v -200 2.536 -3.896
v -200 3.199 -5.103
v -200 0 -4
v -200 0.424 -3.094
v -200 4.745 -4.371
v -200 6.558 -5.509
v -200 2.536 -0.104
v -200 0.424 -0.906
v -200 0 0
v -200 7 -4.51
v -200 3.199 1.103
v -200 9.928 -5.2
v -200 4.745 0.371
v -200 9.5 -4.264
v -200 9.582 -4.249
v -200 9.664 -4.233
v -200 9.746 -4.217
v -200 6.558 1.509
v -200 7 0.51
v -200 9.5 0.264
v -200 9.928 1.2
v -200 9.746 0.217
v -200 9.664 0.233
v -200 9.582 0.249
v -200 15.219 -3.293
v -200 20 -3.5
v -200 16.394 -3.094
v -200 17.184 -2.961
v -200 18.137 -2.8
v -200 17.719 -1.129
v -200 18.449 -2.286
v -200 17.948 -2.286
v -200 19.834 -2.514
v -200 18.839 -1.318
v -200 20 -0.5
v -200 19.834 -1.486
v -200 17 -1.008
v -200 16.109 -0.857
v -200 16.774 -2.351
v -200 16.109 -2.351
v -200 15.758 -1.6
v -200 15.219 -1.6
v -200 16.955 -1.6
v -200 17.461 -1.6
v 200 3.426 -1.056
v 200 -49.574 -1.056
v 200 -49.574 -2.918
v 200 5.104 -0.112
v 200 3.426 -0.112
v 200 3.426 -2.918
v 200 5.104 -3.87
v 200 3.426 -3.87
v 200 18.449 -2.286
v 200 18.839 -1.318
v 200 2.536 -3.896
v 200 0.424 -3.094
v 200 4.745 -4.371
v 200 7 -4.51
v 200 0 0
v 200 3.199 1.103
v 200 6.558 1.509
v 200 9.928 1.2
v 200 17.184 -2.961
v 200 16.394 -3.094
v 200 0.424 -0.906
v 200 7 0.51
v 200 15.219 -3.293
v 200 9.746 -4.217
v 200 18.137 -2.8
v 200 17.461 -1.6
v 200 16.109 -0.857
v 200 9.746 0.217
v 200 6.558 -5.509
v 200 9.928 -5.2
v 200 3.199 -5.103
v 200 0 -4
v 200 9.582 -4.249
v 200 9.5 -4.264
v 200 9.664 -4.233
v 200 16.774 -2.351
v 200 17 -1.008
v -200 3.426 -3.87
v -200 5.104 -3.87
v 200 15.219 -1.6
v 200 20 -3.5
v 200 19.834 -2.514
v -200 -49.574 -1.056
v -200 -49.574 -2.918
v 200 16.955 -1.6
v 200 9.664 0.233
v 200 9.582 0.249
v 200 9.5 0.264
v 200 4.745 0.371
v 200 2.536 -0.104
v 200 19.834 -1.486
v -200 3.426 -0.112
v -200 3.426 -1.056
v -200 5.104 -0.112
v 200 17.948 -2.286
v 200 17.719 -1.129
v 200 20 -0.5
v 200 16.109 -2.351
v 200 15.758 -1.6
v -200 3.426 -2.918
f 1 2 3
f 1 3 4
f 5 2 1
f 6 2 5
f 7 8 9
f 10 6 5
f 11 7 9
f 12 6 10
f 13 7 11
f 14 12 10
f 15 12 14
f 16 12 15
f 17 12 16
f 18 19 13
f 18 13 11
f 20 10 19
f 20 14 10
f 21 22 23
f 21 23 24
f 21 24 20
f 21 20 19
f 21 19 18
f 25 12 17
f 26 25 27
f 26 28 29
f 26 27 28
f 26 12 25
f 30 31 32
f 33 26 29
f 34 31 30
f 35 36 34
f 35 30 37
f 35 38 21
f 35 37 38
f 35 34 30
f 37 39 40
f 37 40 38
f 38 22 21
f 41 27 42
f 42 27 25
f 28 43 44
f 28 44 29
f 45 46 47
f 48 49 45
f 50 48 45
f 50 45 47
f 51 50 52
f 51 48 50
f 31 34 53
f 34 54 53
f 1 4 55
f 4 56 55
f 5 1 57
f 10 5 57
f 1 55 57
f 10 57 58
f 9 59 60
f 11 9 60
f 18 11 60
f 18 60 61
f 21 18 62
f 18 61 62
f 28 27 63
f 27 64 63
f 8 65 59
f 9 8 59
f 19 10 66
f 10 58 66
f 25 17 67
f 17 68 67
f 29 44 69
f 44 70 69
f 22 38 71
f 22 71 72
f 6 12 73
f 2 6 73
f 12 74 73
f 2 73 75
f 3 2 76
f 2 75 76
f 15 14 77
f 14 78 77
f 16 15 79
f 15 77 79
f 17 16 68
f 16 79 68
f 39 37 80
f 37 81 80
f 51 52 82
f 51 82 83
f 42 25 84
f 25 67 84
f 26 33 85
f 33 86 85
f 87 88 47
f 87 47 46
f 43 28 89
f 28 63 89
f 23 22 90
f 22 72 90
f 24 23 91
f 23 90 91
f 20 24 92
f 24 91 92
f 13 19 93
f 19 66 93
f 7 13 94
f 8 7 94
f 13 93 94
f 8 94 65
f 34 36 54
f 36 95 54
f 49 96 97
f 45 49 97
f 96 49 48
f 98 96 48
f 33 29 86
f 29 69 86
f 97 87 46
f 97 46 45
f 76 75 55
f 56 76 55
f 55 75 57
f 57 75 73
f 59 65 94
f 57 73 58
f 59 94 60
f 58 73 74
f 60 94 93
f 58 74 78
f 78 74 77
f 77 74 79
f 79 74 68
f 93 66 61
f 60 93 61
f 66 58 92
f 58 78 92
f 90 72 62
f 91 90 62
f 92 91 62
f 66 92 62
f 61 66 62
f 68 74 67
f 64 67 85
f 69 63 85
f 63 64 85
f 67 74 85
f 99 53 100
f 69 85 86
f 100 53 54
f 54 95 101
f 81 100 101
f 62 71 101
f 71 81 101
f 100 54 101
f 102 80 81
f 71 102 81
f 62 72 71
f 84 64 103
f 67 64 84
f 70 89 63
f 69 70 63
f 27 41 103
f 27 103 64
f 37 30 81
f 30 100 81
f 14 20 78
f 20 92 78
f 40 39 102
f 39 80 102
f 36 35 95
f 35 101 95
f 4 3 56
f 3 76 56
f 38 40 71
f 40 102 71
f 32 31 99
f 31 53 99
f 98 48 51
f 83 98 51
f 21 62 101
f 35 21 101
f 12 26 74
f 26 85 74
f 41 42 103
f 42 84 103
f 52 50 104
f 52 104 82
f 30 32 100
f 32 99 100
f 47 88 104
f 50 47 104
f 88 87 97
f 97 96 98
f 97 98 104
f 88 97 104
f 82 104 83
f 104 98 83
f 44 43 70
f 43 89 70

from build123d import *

# Parameters (mm, degrees)
EXTRUDE_2_DEPTH = 200
SKETCH_2_W      = 3.757825485
SKETCH_2_H      = 1.678700728
EXTRUDE_3_DEPTH = 400
SKETCH_3_W      = 1.861931739
SKETCH_3_H      = 53
EXTRUDE_4_DEPTH = 400


with BuildPart() as part:
    # Эскиз1 → Бобышка-Вытянуть2 (new, symmetric)
    with BuildSketch(Plane(origin=(0, 0, 0), x_dir=(0, 0, -1), z_dir=(1, 0, 0))):
        with BuildLine():
            Line((-1.2, 9.927738917), (0.5, 20))
            Line((0.5, 20), (1.486053856, 19.833573461))
            Line((1.486053856, 19.833573461), (1.318158995, 18.838820003))
            Line((1.318158995, 18.838820003), (2.285826961, 18.448598787))
            Line((2.285826961, 18.448598787), (2.285826961, 17.948310487))
            Line((2.285826961, 17.948310487), (1.129142211, 17.718922123))
            Line((1.129142211, 17.718922123), (1.007869448, 17.000398045))
            Line((1.007869448, 17.000398045), (2.350585212, 16.773773975))
            Line((2.350585212, 16.773773975), (2.350585212, 16.108568155))
            Line((2.350585212, 16.108568155), (0.857346065, 16.108568155))
            Line((0.857346065, 16.108568155), (-0.216510865, 9.746116765))
            ThreePointArc((-0.216510865, 9.746116765), (-0.240713688, 9.623157339), (-0.2638884, 9.5))
            Line((-0.2638884, 9.5), (4.2638884, 9.5))
            ThreePointArc((4.2638884, 9.5), (4.240713688, 9.623157339), (4.216510865, 9.746116765))
            Line((4.216510865, 9.746116765), (3.292845859, 15.218702118))
            Line((3.292845859, 15.218702118), (1.599884262, 15.218702118))
            Line((1.599884262, 15.218702118), (1.599884262, 15.758424824))
            Line((1.599884262, 15.758424824), (3.094446449, 16.394190736))
            Line((3.094446449, 16.394190736), (2.961073194, 17.184408525))
            Line((2.961073194, 17.184408525), (1.599884262, 16.954666547))
            Line((1.599884262, 16.954666547), (1.599884262, 17.460695313))
            Line((1.599884262, 17.460695313), (2.800267704, 18.137158455))
            Line((2.800267704, 18.137158455), (2.513946144, 19.833573461))
            Line((2.513946144, 19.833573461), (3.5, 20))
            Line((3.5, 20), (5.2, 9.927738917))
            ThreePointArc((5.2, 9.927738917), (5.395525451, 4.867711557), (4, 0))
            Line((4, 0), (3.094446449, 0.424231972))
            ThreePointArc((3.094446449, 0.424231972), (4.175386024, 3.63176765), (4.509640896, 7))
            Line((4.509640896, 7), (-0.509640896, 7))
            ThreePointArc((-0.509640896, 7), (-0.175386024, 3.63176765), (0.905553551, 0.424231972))
            Line((0.905553551, 0.424231972), (0, 0))
            ThreePointArc((0, 0), (-1.395525451, 4.867711557), (-1.2, 9.927738917))
        make_face()
    extrude(amount=EXTRUDE_2_DEPTH, both=True)


with BuildPart() as body_2:
    # Эскиз2 → Бобышка-Вытянуть3 (new body)
    with BuildSketch(Plane(origin=(200, 0, 0), x_dir=(0, 0, -1), z_dir=(1, 0, 0))):
        with Locations((1.991137299, 4.265031581)):
            Rectangle(SKETCH_2_W, SKETCH_2_H)
    extrude(amount=-EXTRUDE_3_DEPTH)

    # Эскиз3 → Бобышка-Вытянуть4 (add)
    with BuildSketch(Plane.ZY.offset(200)):
        with Locations((-1.987331142, -23.074318783)):
            Rectangle(SKETCH_3_W, SKETCH_3_H)
    extrude(amount=-EXTRUDE_4_DEPTH)


solid = Compound([part.part, body_2.part])
